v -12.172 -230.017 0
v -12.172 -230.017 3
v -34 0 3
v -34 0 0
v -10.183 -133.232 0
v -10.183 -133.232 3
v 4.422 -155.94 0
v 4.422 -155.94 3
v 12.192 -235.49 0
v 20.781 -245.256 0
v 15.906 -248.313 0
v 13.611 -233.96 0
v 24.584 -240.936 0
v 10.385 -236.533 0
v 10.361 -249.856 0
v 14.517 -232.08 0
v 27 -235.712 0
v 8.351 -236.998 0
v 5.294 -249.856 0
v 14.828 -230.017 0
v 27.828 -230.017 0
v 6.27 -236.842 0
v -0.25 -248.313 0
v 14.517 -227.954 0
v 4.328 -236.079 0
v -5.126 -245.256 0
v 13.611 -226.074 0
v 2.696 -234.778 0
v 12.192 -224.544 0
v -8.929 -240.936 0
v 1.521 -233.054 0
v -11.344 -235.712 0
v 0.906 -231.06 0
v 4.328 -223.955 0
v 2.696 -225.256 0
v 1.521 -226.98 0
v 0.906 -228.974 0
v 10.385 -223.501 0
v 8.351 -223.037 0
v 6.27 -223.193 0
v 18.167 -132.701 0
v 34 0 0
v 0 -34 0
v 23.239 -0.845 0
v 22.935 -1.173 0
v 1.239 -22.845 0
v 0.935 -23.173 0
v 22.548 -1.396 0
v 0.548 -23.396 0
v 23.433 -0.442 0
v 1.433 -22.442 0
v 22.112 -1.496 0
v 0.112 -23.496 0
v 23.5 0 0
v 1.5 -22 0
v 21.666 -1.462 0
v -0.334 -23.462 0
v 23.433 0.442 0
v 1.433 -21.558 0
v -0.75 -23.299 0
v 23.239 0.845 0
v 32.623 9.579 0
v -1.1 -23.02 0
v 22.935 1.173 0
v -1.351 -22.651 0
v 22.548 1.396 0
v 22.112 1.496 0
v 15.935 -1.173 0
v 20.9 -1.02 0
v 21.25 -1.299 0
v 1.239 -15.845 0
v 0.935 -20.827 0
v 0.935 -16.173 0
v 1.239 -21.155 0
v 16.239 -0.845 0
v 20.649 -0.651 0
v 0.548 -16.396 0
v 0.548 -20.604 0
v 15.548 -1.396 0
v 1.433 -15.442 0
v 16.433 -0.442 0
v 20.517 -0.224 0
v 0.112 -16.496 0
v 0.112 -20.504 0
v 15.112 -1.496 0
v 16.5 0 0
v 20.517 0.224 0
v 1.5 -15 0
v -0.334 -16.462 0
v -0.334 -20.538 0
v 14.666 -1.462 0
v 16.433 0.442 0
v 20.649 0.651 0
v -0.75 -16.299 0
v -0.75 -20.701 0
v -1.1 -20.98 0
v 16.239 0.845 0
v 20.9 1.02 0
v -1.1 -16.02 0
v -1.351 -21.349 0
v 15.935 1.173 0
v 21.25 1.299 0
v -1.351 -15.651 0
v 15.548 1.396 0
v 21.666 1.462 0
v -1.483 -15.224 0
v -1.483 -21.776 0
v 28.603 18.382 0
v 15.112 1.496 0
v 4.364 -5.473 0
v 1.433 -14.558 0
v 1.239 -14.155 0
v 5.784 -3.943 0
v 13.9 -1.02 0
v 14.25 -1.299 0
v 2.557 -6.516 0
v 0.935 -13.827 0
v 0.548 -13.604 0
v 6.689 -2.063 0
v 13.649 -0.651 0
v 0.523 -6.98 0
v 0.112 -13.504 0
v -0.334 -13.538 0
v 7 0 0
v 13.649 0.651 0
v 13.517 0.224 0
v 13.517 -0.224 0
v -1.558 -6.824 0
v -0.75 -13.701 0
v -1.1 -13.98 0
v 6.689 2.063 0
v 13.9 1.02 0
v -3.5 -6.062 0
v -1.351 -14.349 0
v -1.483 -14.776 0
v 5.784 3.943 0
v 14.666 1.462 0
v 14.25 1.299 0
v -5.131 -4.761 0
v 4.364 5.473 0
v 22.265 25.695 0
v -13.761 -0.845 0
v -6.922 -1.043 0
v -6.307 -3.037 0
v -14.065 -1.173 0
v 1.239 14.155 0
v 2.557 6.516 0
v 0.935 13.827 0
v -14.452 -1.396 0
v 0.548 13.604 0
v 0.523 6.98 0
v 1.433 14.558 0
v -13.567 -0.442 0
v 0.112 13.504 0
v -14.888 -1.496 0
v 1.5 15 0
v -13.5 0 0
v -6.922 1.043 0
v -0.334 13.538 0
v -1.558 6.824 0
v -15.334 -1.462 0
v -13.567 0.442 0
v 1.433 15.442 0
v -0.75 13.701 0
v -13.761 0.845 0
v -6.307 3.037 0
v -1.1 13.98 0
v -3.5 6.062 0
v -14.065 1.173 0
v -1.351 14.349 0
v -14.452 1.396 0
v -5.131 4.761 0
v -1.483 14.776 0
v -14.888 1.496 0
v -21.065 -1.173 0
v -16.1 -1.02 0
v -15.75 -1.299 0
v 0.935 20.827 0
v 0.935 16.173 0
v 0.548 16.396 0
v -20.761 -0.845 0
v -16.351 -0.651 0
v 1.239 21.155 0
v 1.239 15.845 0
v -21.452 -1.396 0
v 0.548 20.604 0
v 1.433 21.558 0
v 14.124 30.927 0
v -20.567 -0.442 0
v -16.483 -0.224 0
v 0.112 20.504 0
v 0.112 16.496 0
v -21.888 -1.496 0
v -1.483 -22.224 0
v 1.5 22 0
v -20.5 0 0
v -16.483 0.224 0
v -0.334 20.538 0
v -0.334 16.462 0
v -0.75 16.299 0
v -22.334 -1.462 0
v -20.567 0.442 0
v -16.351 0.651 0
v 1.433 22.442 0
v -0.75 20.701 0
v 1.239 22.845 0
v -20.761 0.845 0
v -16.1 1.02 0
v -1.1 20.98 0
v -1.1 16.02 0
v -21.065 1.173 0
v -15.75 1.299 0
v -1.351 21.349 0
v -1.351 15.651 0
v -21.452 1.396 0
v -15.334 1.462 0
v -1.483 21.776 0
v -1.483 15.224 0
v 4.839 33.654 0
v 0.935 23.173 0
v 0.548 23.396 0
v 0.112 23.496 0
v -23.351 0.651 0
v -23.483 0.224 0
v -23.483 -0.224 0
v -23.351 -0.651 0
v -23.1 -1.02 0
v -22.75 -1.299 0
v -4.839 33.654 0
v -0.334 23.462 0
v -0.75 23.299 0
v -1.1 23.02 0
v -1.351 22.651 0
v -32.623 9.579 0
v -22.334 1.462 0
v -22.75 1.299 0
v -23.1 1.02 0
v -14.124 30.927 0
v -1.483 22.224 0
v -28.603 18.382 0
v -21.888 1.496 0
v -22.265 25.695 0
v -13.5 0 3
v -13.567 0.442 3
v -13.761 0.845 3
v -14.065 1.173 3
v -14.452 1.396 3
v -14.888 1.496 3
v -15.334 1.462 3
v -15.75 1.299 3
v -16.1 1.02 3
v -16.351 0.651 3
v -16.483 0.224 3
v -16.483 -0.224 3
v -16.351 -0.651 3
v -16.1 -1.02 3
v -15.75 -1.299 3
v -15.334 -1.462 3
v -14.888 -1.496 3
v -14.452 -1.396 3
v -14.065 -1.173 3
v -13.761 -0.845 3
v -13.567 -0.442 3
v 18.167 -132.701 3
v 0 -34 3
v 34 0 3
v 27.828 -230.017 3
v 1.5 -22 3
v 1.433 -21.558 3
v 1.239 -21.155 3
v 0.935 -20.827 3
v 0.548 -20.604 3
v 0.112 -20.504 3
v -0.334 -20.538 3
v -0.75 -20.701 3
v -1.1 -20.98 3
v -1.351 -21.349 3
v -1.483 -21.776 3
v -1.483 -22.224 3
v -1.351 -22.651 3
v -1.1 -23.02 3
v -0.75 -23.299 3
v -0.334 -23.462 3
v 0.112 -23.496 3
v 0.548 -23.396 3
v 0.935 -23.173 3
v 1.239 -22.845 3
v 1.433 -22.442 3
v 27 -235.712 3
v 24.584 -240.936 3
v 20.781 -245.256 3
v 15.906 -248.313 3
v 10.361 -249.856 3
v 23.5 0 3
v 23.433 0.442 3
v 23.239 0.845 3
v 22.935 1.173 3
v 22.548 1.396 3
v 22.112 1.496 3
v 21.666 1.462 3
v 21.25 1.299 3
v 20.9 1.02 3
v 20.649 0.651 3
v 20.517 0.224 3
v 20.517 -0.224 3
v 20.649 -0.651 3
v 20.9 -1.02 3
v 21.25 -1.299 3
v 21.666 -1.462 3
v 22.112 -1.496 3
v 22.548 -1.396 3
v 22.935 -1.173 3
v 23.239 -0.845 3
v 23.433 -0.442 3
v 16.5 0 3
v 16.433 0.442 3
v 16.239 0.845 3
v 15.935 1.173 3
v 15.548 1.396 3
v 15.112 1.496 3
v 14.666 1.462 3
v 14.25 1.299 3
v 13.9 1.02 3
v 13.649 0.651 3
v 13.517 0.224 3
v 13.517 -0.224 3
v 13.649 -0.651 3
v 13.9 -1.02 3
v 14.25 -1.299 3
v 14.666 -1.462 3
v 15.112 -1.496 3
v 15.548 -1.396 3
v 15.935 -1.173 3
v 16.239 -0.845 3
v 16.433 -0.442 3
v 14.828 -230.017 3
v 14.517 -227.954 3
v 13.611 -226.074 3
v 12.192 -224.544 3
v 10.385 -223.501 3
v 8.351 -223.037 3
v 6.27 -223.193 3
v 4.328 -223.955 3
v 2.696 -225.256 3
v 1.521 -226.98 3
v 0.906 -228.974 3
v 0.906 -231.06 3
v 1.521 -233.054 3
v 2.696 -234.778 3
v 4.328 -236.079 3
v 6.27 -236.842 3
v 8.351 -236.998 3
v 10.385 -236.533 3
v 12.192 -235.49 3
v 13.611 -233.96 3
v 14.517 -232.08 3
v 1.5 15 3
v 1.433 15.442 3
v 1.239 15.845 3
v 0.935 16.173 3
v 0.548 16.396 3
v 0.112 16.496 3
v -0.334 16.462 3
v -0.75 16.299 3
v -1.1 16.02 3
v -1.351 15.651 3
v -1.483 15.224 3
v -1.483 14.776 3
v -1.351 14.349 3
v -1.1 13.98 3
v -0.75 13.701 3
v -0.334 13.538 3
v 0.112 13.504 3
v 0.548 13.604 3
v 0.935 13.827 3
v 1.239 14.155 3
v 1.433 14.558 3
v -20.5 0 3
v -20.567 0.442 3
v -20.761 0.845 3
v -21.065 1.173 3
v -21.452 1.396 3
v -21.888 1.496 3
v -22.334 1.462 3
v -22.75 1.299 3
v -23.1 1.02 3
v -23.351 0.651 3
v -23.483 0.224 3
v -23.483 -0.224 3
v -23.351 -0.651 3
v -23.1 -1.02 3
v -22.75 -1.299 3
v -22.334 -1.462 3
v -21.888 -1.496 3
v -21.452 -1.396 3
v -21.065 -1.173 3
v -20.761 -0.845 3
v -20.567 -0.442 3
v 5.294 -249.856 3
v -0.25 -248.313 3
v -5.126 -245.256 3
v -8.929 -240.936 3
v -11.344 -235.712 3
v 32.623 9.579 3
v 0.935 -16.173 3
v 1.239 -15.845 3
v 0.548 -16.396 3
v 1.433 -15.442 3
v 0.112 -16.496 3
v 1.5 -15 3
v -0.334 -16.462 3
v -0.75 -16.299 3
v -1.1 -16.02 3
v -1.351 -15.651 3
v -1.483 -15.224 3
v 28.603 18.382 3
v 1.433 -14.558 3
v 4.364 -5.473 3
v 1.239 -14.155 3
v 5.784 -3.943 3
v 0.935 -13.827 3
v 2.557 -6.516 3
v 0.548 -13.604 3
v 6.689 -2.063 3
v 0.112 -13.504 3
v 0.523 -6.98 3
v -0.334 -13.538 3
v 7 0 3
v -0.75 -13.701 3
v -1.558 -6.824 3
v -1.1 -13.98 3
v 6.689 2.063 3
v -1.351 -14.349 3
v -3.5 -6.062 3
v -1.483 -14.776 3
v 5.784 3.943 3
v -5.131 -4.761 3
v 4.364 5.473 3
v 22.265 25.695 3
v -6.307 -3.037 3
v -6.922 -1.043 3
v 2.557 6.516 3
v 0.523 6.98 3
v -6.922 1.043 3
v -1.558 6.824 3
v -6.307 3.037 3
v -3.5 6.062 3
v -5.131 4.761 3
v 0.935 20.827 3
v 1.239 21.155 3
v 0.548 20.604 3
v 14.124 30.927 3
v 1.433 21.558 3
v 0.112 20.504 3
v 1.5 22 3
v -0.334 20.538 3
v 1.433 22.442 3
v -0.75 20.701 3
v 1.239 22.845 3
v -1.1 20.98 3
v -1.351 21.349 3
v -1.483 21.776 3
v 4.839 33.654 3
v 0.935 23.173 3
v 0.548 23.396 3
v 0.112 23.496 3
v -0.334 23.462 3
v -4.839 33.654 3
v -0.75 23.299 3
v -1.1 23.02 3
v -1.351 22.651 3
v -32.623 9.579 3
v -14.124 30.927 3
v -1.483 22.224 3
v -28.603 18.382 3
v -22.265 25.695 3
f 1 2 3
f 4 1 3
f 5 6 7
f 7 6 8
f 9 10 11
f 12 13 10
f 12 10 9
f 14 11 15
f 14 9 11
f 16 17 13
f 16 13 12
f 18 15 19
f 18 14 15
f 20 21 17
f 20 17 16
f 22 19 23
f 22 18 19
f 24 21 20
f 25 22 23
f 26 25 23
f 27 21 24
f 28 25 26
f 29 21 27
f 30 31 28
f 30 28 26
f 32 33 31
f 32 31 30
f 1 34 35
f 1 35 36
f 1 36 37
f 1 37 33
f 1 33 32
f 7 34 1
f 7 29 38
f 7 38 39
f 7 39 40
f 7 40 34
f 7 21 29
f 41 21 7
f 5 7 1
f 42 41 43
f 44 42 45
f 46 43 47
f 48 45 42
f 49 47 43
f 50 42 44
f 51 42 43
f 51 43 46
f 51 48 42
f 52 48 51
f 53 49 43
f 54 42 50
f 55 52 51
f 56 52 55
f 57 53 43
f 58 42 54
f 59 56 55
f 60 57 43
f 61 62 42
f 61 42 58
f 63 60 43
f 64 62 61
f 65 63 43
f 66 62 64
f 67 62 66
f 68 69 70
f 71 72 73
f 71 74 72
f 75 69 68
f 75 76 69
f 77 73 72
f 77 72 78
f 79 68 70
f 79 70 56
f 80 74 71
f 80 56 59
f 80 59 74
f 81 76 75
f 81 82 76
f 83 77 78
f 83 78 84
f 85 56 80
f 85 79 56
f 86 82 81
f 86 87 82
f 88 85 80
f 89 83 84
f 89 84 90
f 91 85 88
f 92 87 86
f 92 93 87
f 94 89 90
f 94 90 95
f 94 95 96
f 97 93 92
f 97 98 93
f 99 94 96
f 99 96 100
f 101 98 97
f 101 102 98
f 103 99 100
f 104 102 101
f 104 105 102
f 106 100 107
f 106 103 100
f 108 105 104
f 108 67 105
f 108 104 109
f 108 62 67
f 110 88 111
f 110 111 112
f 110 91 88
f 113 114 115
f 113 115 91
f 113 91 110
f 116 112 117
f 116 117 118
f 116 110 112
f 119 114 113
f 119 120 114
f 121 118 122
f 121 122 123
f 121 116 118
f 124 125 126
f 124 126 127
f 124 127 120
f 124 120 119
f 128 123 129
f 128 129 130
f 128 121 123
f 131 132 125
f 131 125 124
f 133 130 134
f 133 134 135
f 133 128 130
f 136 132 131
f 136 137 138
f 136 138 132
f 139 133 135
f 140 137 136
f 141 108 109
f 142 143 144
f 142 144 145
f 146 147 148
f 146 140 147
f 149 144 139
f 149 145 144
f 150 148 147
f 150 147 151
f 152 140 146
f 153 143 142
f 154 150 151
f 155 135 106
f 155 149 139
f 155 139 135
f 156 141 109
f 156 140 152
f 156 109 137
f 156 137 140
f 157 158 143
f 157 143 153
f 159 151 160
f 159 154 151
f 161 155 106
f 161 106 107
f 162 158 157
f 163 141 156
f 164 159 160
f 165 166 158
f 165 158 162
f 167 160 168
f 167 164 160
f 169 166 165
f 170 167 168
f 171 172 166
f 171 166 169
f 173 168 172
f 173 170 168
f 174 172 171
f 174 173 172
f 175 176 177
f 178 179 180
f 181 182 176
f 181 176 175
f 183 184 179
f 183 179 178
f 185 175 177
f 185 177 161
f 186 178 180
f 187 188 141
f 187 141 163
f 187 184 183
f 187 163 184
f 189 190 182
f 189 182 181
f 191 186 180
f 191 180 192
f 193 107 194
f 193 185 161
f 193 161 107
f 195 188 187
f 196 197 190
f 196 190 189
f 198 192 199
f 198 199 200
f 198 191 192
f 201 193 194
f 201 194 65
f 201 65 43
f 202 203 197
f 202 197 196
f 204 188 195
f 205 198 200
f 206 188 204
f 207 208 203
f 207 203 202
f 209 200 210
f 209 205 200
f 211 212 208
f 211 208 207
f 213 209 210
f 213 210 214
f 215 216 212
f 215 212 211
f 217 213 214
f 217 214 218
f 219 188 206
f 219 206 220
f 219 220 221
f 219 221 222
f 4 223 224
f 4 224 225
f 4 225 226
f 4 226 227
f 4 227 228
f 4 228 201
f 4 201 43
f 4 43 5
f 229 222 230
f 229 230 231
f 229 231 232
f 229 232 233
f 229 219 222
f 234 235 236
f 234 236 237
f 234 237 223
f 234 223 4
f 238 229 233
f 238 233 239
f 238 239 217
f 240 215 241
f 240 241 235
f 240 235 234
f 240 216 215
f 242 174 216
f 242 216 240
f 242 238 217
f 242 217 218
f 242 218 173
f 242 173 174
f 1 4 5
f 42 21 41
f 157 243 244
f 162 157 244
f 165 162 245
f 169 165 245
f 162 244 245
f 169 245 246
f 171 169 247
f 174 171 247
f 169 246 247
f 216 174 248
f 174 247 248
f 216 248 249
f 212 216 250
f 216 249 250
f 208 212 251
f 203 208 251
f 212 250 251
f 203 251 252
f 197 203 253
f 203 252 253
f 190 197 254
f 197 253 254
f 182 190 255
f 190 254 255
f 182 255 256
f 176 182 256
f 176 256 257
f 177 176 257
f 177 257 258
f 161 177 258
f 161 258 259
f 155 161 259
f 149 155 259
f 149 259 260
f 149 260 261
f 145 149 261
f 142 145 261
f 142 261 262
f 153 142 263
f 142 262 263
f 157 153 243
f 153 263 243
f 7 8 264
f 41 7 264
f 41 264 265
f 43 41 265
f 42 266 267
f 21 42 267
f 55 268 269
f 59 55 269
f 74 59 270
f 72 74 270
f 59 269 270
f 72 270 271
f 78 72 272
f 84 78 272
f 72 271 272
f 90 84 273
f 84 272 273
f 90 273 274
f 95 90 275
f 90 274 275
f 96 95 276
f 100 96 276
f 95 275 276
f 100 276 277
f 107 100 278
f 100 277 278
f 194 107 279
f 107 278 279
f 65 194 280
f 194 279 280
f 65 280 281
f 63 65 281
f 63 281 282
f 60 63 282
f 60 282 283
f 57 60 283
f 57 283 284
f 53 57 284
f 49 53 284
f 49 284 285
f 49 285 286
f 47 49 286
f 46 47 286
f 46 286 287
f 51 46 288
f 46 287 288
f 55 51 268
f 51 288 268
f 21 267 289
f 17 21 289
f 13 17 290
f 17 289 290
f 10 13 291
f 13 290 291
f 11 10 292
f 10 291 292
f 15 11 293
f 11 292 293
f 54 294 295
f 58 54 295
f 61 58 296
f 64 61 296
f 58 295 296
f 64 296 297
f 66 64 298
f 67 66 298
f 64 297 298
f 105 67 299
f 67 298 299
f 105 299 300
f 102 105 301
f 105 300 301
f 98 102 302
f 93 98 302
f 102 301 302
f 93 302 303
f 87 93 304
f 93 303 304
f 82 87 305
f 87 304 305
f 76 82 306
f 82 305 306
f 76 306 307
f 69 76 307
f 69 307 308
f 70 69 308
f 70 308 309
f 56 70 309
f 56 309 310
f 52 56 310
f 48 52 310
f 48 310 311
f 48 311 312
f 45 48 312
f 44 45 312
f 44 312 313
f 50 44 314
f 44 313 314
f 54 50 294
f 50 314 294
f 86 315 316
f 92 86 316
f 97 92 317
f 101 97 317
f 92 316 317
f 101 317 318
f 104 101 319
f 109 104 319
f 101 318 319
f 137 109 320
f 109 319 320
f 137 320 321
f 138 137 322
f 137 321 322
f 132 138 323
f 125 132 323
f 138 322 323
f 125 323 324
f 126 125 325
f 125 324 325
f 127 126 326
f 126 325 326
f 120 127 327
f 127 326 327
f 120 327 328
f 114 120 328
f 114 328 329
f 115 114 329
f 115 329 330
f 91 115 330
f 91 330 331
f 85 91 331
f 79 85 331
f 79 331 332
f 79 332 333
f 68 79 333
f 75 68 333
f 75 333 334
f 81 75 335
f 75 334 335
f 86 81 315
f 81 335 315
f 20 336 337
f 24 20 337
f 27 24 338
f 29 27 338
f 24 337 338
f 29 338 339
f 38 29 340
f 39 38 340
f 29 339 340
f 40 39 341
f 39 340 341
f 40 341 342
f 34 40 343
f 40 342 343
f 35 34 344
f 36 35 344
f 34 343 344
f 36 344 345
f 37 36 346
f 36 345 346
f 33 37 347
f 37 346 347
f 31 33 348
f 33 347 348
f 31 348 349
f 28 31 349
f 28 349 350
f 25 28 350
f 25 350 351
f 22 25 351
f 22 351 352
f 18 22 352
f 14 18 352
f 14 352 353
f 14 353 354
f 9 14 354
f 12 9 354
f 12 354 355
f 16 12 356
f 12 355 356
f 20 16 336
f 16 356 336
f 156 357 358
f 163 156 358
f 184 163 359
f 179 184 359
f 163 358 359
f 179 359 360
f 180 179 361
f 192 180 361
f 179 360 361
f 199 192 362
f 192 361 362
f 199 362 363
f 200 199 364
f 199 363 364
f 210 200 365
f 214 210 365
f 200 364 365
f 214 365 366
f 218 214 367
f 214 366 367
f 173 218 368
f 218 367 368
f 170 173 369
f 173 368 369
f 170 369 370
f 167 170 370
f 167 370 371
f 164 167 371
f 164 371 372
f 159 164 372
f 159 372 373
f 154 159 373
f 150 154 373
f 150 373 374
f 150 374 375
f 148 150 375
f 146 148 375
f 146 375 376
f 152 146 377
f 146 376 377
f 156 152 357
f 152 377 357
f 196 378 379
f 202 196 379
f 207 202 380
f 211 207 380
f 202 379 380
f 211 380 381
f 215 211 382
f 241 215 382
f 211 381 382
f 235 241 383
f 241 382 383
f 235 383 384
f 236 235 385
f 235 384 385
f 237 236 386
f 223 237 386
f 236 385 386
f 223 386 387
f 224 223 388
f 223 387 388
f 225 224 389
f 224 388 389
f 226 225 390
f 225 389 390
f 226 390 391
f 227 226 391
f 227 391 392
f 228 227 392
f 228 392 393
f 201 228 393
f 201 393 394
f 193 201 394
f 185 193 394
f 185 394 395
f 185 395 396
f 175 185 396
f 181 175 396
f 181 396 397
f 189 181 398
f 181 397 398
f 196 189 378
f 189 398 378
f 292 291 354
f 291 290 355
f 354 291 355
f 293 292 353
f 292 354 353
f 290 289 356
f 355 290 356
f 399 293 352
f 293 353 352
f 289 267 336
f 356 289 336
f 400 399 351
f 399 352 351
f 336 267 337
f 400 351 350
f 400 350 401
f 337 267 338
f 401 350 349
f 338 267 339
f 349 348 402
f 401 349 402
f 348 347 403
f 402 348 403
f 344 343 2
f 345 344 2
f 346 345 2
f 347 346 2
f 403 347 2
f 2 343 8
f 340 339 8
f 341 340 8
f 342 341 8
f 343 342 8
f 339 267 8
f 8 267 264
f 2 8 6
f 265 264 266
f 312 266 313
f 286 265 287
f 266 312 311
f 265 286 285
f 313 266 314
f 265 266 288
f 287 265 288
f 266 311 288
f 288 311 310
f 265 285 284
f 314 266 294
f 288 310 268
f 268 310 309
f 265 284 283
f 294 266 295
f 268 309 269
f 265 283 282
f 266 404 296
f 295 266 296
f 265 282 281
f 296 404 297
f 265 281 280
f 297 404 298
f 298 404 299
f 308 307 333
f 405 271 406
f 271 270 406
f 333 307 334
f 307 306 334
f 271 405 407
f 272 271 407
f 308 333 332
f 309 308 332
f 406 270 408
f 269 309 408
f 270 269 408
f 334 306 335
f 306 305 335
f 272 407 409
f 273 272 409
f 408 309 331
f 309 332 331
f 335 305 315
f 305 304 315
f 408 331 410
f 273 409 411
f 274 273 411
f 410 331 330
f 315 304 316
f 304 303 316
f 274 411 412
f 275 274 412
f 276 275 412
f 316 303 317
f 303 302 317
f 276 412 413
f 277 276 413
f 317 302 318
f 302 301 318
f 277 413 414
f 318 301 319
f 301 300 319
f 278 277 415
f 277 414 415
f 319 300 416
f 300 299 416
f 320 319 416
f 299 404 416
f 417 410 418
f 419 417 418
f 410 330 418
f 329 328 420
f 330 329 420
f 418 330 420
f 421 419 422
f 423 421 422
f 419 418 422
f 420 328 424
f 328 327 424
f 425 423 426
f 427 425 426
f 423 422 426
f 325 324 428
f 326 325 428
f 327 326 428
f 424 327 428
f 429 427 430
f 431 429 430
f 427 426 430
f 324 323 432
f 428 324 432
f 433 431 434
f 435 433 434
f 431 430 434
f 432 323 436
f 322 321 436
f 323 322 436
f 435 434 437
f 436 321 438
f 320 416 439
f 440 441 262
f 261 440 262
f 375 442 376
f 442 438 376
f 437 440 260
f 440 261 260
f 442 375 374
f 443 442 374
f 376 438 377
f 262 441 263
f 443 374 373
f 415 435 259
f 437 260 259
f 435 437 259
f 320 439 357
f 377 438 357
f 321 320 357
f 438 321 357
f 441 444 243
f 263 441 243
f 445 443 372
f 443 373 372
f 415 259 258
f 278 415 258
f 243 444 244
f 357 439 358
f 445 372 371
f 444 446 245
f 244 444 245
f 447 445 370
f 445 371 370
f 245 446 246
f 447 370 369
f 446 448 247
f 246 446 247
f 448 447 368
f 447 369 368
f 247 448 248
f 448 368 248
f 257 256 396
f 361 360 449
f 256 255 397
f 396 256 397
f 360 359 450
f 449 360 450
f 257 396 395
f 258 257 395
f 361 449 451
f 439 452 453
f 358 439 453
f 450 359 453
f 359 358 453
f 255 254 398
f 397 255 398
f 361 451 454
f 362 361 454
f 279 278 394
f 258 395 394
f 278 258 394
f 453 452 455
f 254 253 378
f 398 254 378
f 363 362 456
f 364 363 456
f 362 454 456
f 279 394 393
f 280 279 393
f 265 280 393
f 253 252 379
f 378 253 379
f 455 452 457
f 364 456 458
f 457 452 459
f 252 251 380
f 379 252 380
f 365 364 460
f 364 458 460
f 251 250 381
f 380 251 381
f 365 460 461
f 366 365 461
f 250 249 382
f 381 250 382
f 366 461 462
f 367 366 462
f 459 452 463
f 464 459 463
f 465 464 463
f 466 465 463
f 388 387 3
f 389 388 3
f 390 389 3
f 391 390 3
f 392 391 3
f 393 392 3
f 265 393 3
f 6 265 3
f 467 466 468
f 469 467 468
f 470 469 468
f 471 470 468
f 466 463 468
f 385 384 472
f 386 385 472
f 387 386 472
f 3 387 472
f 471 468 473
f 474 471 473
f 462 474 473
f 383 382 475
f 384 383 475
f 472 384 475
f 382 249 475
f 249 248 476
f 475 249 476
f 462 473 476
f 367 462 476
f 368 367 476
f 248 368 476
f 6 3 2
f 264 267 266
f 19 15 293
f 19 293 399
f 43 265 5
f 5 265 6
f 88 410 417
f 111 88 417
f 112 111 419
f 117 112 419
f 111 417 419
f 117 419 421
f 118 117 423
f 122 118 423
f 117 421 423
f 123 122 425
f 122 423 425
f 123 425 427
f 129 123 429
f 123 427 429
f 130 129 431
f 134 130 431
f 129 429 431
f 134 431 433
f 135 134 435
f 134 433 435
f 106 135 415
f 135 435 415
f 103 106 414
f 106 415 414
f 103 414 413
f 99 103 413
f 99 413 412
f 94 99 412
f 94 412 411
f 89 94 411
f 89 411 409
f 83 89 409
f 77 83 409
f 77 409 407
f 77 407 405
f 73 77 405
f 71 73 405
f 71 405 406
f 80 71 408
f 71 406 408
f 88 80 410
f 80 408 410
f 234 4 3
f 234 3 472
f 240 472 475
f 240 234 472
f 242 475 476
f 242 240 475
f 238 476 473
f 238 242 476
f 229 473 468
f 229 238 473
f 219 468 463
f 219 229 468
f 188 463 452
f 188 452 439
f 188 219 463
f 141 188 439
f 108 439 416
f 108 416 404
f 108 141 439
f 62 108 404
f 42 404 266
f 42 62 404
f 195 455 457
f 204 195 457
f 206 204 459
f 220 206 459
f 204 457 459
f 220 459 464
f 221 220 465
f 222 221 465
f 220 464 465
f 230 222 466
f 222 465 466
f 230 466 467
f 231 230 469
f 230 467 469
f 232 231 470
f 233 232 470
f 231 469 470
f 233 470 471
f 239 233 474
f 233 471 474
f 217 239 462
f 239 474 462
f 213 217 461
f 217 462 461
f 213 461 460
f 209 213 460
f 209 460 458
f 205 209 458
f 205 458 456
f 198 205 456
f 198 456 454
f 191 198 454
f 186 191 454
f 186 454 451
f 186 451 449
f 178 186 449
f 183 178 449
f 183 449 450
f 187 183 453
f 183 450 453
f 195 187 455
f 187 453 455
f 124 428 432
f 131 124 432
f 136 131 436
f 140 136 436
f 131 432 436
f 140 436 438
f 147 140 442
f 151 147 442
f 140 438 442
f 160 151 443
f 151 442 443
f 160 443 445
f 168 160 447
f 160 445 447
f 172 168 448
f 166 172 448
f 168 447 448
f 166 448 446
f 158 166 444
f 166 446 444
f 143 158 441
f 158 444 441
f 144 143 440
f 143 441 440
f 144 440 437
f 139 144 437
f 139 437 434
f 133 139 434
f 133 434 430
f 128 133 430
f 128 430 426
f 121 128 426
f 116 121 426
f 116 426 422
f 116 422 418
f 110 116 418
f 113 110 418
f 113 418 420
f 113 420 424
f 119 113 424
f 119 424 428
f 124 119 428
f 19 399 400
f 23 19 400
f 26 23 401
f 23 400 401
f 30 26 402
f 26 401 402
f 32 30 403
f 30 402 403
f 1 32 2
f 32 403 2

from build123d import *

# Parameters (mm, degrees)
EXTRUDE_1_DEPTH     = 3
CUT_EXTRUDE_1_DEPTH = 3
CUT_EXTRUDE_2_DEPTH = 3
SKETCH_5_R          = 1.5
CUT_EXTRUDE_3_DEPTH = 3
CUT_EXTRUDE_4_DEPTH = 3
SKETCH_7_R          = 7
CUT_EXTRUDE_5_DEPTH = 3
SKETCH_8_R          = 7
CUT_EXTRUDE_6_DEPTH = 10


with BuildPart() as part:
    # 草图1 → 凸台-拉伸1 (new body)
    with BuildSketch(Plane.XY):
        with BuildLine():
            Line((34, 0), (42.481679801, -249.85608079))
            Line((42.481679801, -249.85608079), (-25.518320199, -249.85608079))
            Line((-25.518320199, -249.85608079), (-34, 0))
            ThreePointArc((-34, 0), (0, 34), (34, 0))
        make_face()
    extrude(amount=EXTRUDE_1_DEPTH)

    # 草图3 → 切除-拉伸1 (cut)
    with BuildSketch(Plane.XY.offset(3)):
        with BuildLine():
            Line((-12.172192567, -230.017175725), (-34, 0))
            Line((-34, 0), (-25.518320199, -249.85608079))
            Line((-25.518320199, -249.85608079), (5.294460669, -249.85608079))
            ThreePointArc((5.294460669, -249.85608079), (-7.18330404, -243.233322379), (-12.172192567, -230.017175725))
        make_face()
    extrude(amount=-CUT_EXTRUDE_1_DEPTH, mode=Mode.SUBTRACT)

    # 草图3<4> → 切除-拉伸2 (cut)
    with BuildSketch(Plane.XY.offset(3)):
        with BuildLine():
            Line((42.481679801, -249.85608079), (34, 0))
            Line((34, 0), (27.827807433, -230.017175725))
            ThreePointArc((27.827807433, -230.017175725), (22.838918905, -243.233322379), (10.361154196, -249.85608079))
            Line((10.361154196, -249.85608079), (42.481679801, -249.85608079))
        make_face()
    extrude(amount=-CUT_EXTRUDE_2_DEPTH, mode=Mode.SUBTRACT)

    # 草图5 → 切除-拉伸3 (cut)
    with BuildSketch(Plane.XY.offset(3)):
        with Locations((0, 22)):
            Circle(SKETCH_5_R)
        with Locations((0, 15)):
            Circle(SKETCH_5_R)
        with Locations((-22, 0)):
            Circle(SKETCH_5_R)
        with Locations((-15, 0)):
            Circle(SKETCH_5_R)
        with Locations((0, -15)):
            Circle(SKETCH_5_R)
        with Locations((15, 0)):
            Circle(SKETCH_5_R)
        with Locations((22, 0)):
            Circle(SKETCH_5_R)
        with Locations((0, -22)):
            Circle(SKETCH_5_R)
    extrude(amount=-CUT_EXTRUDE_3_DEPTH, mode=Mode.SUBTRACT)

    # 草图6 → 切除-拉伸4 (cut)
    with BuildSketch(Plane.XY.offset(3)):
        Polygon((0, -34), (-10.183472327, -133.231632376), (4.42204079, -155.940198746), (18.166966985, -132.700641867), align=None)
    extrude(amount=-CUT_EXTRUDE_4_DEPTH, mode=Mode.SUBTRACT)

    # 草图7 → 切除-拉伸5 (cut)
    with BuildSketch(Plane.XY.offset(3)):
        with Locations((7.827807433, -230.017175725)):
            Circle(SKETCH_7_R)
    extrude(amount=-CUT_EXTRUDE_5_DEPTH, mode=Mode.SUBTRACT)

    # 草图8 → 切除-拉伸6 (cut)
    with BuildSketch(Plane.XY.offset(3)):
        Circle(SKETCH_8_R)
    extrude(amount=-CUT_EXTRUDE_6_DEPTH, mode=Mode.SUBTRACT)


solid = part.part
